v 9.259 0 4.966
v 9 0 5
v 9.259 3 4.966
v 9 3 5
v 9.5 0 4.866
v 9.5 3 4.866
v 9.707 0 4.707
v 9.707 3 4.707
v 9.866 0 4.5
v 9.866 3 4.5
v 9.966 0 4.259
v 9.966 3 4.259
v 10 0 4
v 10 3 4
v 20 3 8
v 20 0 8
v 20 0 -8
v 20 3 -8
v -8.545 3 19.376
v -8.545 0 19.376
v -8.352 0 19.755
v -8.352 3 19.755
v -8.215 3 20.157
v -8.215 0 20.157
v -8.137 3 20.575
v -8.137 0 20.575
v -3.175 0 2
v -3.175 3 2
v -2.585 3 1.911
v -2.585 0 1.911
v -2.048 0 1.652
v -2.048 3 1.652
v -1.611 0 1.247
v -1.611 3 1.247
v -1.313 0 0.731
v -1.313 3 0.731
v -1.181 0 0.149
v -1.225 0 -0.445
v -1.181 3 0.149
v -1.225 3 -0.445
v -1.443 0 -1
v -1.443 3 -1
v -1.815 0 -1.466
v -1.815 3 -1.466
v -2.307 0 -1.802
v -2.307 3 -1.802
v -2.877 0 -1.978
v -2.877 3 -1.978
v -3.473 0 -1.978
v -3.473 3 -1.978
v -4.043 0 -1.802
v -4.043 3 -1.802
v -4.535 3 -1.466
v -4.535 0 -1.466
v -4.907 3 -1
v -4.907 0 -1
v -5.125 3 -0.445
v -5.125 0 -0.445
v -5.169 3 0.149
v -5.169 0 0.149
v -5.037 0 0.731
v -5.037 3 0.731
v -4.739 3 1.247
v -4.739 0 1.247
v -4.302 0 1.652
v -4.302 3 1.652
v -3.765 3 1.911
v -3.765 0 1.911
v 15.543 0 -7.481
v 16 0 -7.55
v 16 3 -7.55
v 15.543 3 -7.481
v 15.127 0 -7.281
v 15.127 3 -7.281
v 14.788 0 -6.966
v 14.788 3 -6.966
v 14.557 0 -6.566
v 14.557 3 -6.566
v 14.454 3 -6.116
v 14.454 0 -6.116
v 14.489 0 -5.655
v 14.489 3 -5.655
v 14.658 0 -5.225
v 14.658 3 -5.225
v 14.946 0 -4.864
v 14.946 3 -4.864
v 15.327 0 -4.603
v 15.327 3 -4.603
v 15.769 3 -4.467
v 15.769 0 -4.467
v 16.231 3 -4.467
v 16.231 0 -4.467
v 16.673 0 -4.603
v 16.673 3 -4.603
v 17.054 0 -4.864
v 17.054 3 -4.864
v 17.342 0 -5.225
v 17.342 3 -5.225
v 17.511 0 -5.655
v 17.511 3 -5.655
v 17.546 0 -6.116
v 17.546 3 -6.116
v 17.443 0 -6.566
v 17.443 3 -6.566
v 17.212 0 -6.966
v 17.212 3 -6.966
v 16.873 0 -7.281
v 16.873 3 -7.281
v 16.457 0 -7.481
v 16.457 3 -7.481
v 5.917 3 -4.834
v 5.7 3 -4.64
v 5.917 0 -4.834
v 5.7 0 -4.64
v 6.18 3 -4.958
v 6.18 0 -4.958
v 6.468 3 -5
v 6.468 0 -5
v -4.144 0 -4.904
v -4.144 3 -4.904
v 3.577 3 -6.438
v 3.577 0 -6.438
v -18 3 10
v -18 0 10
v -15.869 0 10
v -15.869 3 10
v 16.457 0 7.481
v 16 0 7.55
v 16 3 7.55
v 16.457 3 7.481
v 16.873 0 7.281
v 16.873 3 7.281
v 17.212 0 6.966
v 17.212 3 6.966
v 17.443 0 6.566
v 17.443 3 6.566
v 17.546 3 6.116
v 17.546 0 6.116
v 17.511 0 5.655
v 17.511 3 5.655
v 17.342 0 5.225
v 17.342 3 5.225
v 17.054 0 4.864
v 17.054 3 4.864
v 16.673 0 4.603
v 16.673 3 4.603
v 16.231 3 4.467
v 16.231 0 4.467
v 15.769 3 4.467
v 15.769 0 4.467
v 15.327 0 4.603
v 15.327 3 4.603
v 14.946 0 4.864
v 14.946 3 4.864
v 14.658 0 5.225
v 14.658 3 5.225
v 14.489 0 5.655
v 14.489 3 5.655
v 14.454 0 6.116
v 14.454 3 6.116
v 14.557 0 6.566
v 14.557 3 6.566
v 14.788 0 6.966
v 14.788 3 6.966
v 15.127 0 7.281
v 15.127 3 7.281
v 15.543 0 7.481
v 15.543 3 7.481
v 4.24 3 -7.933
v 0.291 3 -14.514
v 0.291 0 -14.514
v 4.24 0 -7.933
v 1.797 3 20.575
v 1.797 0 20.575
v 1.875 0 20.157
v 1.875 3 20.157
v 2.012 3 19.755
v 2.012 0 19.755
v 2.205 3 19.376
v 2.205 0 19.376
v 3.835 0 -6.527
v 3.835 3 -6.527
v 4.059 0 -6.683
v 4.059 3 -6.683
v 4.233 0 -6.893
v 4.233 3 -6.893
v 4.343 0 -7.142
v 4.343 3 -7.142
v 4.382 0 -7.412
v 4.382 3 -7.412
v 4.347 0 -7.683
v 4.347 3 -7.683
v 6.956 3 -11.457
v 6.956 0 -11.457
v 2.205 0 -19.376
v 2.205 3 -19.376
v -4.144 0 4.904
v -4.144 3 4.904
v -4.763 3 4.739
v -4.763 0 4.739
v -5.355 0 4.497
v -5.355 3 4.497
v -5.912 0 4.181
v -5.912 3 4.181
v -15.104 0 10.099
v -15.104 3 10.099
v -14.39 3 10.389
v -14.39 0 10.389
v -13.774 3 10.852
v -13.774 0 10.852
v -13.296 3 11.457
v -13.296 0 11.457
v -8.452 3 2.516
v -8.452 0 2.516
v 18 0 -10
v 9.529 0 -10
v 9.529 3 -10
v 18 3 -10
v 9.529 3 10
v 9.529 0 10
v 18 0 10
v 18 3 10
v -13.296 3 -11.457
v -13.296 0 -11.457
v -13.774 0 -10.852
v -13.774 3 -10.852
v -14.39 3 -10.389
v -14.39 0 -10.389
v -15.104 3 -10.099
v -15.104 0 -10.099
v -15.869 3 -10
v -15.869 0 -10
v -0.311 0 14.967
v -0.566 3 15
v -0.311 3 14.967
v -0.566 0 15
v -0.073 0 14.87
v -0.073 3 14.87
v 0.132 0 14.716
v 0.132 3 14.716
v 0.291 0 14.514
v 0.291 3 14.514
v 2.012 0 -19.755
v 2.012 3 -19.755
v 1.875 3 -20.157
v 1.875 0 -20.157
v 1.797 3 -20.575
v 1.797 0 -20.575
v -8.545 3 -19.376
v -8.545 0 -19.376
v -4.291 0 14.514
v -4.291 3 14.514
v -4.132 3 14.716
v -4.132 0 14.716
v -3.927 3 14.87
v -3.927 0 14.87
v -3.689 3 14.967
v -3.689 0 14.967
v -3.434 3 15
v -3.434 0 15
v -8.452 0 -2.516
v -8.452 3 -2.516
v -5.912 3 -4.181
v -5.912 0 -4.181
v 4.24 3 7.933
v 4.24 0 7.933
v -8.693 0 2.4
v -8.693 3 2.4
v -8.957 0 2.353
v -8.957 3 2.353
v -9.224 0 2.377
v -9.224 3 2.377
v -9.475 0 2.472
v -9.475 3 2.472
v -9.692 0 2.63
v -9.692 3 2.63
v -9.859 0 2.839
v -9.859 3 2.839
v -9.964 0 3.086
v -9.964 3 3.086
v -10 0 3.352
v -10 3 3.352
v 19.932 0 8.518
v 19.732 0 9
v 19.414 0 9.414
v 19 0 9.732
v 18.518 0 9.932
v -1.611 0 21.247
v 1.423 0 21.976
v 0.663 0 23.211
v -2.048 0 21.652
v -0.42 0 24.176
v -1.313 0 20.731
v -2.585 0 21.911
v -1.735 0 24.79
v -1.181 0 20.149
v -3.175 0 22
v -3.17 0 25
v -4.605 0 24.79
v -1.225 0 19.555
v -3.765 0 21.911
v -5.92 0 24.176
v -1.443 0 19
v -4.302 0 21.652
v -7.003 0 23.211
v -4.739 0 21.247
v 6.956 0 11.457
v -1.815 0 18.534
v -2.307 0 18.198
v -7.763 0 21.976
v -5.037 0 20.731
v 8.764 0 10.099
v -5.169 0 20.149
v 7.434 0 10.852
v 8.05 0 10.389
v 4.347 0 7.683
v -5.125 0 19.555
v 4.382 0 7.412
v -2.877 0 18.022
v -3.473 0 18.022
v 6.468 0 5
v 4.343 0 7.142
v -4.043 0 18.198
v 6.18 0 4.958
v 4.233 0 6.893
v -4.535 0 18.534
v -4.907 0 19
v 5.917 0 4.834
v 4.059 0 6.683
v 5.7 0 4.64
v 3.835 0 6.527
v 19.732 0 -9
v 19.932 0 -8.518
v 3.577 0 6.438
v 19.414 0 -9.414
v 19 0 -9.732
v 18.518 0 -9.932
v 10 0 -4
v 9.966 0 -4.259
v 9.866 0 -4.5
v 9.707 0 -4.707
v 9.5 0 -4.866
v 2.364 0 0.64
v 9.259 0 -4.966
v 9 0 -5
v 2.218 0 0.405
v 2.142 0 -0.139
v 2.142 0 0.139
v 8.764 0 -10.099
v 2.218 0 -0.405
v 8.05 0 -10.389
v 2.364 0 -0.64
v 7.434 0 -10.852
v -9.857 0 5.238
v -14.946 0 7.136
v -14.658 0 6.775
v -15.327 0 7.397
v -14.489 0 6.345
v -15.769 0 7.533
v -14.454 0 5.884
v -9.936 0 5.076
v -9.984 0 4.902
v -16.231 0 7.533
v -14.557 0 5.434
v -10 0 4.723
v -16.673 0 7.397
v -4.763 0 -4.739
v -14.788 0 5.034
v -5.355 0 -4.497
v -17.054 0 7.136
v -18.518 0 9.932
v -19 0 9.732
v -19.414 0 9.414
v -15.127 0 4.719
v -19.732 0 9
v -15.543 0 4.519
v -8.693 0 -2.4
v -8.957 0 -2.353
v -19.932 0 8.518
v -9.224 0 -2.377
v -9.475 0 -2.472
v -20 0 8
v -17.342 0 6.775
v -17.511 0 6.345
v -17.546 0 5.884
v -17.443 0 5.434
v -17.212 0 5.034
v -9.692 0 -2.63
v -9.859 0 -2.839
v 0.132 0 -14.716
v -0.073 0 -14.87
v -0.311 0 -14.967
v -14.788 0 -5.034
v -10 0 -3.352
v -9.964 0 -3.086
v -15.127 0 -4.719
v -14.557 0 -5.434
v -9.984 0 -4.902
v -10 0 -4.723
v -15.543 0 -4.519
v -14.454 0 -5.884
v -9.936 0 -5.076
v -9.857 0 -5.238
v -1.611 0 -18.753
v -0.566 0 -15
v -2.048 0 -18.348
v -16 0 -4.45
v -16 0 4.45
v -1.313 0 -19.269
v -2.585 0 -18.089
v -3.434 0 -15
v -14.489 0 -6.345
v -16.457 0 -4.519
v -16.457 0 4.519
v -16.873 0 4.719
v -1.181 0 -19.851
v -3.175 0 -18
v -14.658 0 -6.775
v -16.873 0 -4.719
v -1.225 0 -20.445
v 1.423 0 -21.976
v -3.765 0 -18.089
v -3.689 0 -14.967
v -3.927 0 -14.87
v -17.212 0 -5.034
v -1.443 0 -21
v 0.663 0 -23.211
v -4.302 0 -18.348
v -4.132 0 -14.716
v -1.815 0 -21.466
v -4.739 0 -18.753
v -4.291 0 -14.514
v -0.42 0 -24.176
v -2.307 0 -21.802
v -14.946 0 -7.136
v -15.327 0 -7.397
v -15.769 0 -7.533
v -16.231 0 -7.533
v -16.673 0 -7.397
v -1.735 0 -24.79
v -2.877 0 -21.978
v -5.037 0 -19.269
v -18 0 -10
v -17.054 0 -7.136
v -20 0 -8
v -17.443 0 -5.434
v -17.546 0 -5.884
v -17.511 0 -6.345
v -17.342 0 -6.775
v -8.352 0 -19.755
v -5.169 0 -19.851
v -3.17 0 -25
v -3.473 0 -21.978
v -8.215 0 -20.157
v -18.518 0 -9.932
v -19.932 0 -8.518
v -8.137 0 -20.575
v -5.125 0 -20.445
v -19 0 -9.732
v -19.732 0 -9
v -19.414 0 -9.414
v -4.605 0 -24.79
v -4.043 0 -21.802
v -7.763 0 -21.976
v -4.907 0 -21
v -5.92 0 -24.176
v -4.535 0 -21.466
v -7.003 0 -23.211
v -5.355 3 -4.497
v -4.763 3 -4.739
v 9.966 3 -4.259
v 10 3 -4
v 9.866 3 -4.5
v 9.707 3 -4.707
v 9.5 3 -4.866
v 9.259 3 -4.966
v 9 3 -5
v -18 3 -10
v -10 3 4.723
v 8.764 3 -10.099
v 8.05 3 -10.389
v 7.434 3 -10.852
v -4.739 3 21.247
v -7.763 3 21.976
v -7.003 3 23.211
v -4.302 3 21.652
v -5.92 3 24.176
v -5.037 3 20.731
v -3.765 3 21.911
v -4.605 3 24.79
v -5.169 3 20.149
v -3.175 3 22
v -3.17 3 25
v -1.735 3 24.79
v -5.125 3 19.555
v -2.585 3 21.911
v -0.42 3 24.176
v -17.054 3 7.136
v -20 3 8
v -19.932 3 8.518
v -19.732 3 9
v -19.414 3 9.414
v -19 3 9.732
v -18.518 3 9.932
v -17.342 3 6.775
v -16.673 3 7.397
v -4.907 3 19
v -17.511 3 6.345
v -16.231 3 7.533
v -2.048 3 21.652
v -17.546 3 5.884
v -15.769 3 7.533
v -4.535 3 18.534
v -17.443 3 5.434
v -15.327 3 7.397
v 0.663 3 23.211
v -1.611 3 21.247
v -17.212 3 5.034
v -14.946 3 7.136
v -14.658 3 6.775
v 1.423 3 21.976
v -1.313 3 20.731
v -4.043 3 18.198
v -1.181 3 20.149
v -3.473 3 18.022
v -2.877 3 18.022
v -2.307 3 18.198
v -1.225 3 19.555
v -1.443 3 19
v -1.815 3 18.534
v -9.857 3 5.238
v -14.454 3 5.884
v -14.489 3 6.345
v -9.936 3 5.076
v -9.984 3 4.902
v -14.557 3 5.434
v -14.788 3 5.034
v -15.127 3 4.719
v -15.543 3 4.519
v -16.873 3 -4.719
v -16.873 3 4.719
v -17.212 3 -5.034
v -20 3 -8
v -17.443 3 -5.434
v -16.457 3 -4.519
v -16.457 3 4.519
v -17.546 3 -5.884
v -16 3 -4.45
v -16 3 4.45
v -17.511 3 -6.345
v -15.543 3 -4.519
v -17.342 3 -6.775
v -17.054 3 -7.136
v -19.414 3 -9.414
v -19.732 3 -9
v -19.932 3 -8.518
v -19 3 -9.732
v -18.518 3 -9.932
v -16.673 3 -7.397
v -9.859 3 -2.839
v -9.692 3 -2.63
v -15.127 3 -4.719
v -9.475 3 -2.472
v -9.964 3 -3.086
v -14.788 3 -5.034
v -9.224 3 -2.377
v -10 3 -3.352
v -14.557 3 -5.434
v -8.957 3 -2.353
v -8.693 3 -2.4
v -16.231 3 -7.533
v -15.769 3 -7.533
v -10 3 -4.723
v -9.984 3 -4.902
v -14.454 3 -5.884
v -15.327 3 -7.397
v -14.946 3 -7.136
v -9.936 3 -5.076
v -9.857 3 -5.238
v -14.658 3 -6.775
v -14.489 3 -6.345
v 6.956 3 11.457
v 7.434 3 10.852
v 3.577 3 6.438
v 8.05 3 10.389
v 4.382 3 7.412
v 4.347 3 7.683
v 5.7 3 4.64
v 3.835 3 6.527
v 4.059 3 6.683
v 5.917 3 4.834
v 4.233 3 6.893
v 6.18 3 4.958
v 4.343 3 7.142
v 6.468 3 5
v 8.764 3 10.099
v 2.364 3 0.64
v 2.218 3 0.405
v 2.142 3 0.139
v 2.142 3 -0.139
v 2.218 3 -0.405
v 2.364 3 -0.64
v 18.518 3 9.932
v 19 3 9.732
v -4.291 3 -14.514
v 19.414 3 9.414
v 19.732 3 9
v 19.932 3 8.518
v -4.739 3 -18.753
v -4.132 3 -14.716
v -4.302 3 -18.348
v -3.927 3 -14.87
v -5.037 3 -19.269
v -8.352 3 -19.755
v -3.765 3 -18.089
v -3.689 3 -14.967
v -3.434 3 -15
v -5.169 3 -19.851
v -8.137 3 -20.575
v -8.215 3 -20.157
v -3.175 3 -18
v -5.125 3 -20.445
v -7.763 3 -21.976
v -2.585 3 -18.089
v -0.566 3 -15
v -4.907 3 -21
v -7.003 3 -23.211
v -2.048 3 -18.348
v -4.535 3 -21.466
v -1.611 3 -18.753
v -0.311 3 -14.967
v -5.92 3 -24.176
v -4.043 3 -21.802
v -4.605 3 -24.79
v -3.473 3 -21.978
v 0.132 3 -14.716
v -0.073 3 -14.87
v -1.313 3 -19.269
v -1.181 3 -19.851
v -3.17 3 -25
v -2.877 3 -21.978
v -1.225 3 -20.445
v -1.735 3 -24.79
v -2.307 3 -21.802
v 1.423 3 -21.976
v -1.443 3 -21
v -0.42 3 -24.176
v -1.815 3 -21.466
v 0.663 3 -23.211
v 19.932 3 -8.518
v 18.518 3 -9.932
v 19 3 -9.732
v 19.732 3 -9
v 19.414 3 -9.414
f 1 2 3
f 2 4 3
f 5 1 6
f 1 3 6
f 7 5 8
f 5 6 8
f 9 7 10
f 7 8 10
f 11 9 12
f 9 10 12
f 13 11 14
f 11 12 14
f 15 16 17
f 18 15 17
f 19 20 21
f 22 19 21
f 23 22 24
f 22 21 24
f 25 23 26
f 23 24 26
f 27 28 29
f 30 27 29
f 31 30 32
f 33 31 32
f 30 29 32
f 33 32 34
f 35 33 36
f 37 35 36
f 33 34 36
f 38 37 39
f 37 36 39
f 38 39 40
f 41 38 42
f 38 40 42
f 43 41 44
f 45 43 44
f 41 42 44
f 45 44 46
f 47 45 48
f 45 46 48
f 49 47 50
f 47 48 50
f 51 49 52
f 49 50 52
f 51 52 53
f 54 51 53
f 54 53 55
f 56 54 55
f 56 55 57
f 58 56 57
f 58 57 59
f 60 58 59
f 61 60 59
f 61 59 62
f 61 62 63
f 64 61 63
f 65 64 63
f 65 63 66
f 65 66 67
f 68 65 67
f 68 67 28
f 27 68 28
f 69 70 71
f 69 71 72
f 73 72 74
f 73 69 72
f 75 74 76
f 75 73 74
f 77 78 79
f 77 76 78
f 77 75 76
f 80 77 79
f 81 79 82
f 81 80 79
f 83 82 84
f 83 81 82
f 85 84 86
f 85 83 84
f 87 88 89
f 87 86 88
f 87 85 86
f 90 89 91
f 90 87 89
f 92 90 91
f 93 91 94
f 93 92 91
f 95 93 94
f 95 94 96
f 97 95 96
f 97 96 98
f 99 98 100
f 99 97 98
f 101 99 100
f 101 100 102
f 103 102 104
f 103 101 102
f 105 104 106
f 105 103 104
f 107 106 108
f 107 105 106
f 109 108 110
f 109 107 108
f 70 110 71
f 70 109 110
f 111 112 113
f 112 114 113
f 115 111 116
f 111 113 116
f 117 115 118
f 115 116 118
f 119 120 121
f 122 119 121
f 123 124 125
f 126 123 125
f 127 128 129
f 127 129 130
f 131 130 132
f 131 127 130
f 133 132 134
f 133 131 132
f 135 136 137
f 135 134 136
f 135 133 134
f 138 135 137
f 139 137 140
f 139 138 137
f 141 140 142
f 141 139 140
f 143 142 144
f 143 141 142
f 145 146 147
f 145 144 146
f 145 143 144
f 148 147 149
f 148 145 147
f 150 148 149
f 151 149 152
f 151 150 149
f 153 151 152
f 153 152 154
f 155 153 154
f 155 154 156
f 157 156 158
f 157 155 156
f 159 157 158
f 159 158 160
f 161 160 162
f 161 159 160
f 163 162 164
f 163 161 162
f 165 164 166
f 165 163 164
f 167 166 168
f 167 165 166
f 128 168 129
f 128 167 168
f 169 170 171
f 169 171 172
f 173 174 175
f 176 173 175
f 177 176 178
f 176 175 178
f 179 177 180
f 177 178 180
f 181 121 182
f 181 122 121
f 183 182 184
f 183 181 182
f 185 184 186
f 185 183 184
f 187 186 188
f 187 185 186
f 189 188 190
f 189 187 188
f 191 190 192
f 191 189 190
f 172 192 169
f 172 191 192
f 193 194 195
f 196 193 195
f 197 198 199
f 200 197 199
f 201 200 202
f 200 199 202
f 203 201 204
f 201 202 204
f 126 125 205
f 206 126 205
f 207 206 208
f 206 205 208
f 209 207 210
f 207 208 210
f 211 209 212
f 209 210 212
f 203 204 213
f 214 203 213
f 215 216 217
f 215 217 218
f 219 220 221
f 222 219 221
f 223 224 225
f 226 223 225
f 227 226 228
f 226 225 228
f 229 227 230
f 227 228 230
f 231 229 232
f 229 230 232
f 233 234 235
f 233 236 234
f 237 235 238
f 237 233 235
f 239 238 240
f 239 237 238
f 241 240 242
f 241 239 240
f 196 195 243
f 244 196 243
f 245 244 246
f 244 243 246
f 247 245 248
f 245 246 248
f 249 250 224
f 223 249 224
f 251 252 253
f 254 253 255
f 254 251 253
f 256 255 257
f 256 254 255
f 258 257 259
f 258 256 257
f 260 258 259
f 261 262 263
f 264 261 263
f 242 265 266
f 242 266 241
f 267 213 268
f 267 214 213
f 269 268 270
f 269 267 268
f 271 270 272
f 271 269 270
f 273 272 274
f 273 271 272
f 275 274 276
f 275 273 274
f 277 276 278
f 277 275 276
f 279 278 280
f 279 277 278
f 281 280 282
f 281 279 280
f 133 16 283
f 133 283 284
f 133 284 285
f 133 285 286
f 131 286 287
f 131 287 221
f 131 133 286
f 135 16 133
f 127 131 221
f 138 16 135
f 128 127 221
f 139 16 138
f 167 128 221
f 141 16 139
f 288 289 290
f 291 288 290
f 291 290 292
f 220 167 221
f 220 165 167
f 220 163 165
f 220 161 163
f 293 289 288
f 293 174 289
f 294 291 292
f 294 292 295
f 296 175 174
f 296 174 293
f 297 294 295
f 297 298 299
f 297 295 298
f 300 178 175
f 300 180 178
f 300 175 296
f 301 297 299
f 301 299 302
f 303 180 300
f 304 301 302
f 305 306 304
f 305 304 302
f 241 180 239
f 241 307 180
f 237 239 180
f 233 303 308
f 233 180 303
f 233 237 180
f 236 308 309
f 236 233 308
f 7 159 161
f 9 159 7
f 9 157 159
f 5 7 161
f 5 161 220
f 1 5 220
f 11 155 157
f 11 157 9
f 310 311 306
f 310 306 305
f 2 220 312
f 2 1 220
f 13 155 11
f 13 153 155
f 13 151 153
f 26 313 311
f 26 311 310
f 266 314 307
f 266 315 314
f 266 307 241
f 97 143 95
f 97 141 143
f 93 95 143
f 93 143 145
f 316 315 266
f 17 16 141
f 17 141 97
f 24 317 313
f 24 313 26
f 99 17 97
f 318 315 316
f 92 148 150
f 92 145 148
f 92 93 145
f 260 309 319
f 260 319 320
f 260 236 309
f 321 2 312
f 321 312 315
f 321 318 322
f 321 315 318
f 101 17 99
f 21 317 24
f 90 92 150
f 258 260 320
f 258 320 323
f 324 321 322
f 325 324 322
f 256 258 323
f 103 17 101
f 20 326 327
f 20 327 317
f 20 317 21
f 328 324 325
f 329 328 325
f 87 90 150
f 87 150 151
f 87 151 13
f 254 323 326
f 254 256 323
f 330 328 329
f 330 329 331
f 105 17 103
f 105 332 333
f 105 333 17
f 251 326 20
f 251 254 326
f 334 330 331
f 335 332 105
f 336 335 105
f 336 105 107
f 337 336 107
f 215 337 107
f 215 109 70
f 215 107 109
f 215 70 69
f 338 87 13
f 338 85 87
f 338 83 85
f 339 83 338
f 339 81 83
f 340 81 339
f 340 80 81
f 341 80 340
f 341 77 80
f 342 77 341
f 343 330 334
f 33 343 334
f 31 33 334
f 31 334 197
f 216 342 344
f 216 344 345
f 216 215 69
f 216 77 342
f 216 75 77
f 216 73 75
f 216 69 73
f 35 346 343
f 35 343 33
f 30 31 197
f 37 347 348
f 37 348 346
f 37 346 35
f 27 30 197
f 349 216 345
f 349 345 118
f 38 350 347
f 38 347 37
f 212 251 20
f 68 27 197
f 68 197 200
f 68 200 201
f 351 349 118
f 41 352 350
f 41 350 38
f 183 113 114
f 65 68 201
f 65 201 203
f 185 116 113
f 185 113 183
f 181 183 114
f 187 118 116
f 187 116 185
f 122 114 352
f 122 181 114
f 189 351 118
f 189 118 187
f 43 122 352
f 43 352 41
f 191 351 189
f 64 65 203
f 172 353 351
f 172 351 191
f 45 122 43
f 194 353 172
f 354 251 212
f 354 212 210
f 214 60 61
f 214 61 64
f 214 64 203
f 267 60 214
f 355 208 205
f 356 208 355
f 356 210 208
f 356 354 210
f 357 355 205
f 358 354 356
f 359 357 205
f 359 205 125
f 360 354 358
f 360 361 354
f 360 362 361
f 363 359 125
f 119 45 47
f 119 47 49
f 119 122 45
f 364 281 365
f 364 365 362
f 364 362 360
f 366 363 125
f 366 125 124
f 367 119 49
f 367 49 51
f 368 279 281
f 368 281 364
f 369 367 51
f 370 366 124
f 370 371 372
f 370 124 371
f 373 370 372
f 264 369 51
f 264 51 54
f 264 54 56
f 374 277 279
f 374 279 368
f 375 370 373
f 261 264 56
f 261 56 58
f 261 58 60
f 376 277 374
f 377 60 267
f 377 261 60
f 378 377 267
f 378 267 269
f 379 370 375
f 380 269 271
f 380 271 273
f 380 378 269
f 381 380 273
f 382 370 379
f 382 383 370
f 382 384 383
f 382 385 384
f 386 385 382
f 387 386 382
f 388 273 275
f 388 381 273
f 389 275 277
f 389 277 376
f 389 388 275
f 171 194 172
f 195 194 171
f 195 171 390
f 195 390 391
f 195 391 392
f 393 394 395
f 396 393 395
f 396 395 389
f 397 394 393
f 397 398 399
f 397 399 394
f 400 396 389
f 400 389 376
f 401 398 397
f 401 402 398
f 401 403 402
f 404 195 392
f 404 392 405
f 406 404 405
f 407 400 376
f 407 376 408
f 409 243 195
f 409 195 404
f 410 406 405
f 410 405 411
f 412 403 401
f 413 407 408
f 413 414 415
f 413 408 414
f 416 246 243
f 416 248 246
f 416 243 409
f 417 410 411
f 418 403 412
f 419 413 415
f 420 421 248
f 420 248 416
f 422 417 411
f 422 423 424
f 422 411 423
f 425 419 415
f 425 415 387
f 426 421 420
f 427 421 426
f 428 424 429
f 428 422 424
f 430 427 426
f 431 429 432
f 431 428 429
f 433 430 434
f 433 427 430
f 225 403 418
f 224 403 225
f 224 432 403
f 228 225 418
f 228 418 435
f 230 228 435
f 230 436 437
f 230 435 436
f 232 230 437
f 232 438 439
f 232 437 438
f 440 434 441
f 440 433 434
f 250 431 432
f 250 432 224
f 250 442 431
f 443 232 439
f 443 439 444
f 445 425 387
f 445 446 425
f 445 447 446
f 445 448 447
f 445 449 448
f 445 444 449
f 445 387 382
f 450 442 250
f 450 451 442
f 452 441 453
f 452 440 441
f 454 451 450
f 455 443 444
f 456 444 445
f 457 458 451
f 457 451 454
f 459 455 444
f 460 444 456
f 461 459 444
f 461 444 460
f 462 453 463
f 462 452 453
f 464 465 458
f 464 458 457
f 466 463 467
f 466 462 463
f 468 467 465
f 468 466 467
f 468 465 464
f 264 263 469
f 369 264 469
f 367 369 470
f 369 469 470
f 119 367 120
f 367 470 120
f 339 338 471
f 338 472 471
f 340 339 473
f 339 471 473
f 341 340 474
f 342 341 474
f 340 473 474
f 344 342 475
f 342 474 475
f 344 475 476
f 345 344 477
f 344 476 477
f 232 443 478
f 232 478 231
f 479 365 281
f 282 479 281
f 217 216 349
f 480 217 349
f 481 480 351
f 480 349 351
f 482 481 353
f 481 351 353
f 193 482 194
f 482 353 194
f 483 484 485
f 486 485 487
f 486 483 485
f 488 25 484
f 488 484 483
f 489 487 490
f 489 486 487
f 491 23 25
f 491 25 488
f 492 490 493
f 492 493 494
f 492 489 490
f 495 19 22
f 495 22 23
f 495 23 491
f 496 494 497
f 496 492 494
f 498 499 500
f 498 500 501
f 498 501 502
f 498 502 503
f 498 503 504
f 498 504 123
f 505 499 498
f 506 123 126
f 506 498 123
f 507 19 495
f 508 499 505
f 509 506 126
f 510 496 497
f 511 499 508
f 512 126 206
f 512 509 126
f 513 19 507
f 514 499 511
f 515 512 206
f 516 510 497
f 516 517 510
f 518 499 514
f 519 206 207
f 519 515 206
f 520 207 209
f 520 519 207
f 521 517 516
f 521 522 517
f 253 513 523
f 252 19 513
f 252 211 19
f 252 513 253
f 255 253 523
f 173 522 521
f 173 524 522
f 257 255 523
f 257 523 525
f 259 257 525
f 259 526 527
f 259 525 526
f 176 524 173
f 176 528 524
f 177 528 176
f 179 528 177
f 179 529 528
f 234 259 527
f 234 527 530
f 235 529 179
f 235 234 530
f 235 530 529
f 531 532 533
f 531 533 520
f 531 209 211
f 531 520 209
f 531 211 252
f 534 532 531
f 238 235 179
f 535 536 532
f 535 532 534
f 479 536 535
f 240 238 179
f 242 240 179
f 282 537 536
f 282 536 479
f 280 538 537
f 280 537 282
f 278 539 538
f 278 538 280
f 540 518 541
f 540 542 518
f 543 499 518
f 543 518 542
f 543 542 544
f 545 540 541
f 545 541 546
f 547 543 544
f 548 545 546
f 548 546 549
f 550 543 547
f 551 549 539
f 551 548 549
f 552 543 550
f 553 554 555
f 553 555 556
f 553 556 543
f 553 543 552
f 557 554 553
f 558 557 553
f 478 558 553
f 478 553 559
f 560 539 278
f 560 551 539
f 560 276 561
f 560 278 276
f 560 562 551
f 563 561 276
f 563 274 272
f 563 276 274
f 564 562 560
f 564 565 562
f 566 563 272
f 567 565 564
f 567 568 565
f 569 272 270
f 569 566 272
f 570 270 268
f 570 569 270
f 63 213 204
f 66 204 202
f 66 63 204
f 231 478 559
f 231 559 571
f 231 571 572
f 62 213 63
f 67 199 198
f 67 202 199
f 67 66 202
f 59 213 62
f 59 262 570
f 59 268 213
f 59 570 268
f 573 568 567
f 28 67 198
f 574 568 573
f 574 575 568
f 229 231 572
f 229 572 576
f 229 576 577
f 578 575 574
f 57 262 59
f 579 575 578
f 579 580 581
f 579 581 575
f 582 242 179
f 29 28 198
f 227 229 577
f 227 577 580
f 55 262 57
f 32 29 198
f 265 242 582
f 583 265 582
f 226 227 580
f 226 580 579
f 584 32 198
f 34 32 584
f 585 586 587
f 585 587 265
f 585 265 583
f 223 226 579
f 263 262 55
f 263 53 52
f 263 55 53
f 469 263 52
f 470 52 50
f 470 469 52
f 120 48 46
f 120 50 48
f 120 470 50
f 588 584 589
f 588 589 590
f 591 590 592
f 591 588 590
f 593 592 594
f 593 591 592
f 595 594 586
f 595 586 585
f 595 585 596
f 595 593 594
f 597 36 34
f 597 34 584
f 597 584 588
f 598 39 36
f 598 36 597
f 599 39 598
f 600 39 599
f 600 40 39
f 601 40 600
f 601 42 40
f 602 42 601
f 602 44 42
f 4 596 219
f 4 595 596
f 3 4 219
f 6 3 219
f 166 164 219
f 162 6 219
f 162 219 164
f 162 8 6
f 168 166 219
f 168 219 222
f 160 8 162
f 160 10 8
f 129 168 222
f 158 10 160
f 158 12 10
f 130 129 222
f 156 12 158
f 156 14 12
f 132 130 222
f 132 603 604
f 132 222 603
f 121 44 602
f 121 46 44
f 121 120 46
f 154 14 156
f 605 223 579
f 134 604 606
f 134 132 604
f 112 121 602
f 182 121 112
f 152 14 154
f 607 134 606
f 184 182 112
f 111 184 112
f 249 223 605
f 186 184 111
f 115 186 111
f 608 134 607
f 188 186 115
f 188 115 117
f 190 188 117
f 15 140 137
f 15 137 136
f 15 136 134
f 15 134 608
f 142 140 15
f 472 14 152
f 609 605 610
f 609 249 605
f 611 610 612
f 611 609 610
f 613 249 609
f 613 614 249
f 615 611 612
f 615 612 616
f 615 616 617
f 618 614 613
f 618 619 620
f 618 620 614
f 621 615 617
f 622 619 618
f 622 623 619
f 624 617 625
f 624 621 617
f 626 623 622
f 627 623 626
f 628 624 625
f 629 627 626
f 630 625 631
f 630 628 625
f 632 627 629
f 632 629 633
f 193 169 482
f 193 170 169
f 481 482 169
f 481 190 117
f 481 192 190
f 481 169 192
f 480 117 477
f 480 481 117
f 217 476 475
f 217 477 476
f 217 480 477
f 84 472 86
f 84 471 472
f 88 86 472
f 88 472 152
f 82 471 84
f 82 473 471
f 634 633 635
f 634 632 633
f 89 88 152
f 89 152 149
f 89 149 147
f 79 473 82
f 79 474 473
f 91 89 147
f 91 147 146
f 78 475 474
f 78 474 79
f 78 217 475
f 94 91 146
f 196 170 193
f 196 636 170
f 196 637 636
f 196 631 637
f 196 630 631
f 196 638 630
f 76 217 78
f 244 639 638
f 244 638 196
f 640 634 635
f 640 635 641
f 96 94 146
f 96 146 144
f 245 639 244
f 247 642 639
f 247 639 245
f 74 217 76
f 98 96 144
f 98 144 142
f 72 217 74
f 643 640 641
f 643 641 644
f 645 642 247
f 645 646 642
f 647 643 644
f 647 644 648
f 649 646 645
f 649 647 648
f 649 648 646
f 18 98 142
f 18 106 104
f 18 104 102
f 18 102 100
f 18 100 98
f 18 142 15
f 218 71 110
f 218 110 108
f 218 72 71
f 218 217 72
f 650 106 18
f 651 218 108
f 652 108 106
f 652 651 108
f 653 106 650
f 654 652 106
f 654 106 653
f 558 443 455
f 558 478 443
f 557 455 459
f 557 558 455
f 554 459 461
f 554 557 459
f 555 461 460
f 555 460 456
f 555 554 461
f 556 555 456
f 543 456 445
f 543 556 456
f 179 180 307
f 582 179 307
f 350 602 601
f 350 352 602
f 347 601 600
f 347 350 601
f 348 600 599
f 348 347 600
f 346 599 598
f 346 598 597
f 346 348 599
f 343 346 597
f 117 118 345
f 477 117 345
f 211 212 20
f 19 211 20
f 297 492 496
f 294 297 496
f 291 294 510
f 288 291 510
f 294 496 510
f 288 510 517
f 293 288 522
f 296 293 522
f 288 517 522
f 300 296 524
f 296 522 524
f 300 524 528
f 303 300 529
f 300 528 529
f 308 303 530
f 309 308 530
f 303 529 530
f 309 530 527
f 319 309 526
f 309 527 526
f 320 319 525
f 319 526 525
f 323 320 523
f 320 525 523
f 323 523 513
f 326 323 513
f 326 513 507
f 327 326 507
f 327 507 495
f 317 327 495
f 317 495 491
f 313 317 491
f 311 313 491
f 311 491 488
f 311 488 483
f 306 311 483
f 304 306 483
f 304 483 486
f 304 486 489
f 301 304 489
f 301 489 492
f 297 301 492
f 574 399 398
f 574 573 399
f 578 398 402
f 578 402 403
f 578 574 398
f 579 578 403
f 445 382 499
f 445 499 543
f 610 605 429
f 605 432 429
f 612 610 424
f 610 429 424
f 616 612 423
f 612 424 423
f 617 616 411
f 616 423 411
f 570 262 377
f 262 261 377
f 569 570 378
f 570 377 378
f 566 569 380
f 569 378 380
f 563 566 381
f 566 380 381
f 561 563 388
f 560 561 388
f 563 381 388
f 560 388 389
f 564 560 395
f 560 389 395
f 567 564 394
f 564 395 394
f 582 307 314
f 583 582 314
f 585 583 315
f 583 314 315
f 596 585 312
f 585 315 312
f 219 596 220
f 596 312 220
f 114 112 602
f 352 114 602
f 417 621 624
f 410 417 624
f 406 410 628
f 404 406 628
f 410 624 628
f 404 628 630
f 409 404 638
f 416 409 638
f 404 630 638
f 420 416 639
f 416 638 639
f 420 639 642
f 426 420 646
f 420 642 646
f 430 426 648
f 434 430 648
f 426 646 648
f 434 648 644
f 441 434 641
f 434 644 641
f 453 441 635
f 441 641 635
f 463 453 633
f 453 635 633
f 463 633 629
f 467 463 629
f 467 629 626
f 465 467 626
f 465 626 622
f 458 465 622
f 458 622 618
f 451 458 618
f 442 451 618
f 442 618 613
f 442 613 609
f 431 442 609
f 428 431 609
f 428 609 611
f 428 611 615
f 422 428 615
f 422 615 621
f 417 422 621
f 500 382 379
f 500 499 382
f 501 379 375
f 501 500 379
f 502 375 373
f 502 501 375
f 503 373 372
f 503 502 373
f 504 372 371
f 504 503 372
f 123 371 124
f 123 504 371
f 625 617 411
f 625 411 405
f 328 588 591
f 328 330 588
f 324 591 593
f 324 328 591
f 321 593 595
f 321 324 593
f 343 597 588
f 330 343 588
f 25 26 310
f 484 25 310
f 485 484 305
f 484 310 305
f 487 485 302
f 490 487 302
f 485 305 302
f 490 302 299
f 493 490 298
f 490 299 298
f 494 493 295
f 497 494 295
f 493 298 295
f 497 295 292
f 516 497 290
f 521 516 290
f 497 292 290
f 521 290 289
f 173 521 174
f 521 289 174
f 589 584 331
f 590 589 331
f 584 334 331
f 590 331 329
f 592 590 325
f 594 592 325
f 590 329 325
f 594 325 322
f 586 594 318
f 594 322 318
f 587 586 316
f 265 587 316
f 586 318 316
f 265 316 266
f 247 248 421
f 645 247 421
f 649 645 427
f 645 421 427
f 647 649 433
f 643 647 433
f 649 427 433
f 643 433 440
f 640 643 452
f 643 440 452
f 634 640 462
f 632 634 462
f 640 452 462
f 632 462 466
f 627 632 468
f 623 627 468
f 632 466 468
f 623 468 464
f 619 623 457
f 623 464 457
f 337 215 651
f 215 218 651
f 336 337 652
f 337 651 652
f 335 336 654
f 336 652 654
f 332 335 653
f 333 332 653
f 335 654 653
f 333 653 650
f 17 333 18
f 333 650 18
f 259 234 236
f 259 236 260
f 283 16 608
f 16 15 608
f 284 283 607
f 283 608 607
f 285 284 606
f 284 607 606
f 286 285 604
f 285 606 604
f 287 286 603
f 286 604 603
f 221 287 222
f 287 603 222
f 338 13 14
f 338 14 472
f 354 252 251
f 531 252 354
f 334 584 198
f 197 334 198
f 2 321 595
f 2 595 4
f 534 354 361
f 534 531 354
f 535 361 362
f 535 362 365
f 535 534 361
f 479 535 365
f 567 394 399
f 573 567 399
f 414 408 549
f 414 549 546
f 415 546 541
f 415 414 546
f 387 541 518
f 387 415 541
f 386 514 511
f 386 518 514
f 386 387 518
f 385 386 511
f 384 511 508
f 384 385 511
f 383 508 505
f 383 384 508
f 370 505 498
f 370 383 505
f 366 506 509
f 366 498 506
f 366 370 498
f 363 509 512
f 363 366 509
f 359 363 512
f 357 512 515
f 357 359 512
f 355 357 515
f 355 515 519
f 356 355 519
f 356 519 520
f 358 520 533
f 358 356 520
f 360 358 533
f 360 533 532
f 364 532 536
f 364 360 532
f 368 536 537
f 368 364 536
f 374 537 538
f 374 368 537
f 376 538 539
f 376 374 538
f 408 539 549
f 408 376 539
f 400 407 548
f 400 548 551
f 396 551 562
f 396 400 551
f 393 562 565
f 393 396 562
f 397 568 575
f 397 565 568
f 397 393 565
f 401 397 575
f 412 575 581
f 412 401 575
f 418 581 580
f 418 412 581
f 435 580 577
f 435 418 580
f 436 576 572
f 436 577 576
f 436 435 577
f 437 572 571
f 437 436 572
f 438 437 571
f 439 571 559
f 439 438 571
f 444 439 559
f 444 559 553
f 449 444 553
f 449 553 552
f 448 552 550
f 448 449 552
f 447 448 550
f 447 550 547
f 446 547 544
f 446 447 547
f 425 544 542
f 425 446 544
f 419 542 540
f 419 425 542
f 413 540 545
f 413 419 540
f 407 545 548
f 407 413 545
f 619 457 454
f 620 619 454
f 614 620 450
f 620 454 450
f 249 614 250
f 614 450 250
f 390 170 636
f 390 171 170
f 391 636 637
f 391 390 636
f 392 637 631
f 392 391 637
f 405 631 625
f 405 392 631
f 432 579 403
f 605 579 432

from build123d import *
from OCP.BRepFilletAPI import BRepFilletAPI_MakeChamfer

# Parameters (mm, degrees)
SKETCH_1_W           = 40
SKETCH_1_H           = 20
SKETCH_1_R           = 1.55
SKETCH_1_W_2         = 20
SKETCH_1_H_2         = 10
EXTRUDE_1_DEPTH      = 3
SKETCH_2_R           = 2
EXTRUDE_2_DEPTH      = 3
FILLET_1_R           = 2
SKETCH_3_W           = 10
SKETCH_3_H           = 10
CUT_EXTRUDE_1_DEPTH  = 33.155870382
CHAMFER_1_SIZE       = 6
CHAMFER_1_SIZE_2     = 10
FILLET_2_OUTLINE_R   = 2
FILLET_2_OUTLINE_R_2 = 1.55
FILLET_2_OUTLINE_W   = 20
FILLET_2_OUTLINE_H   = 10
FILLET_2_DEPTH       = 3
CUT_EXTRUDE_2_DEPTH  = 33.155870382
SKETCH_5_R           = 2
EXTRUDE_3_DEPTH      = 3
FILLET_3_R           = 1
SKETCH_6_R           = 2
EXTRUDE_4_DEPTH      = 3
SKETCH_7_R           = 2
CUT_EXTRUDE_3_DEPTH  = 33.155870382


with BuildPart() as part:
    # 草图1 → 凸台-拉伸1 (new body)
    with BuildSketch(Plane(origin=(0, 0, 0), x_dir=(1, 0, 0), z_dir=(0, 1, 0))):
        Rectangle(SKETCH_1_W, SKETCH_1_H)
        with Locations(Location((-16, 6, 0), (0, 0, 270))):
            Circle(SKETCH_1_R, mode=Mode.SUBTRACT)
        with Locations(Location((16, 6, 0), (0, 0, 90))):
            Circle(SKETCH_1_R, mode=Mode.SUBTRACT)
        with Locations(Location((16, -6, 0), (0, 0, 270))):
            Circle(SKETCH_1_R, mode=Mode.SUBTRACT)
        with Locations(Location((-16, -6, 0), (0, 0, 90))):
            Circle(SKETCH_1_R, mode=Mode.SUBTRACT)
        Rectangle(SKETCH_1_W_2, SKETCH_1_H_2, mode=Mode.SUBTRACT)
    extrude(amount=EXTRUDE_1_DEPTH)

    # 草图2 → 凸台-拉伸2 (add, through all)
    with BuildSketch(Plane(origin=(0, 3, 0), x_dir=(1, 0, 0), z_dir=(0, 1, 0))):
        with BuildLine():
            Line((-8.17, 20), (-8.17, -20))
            ThreePointArc((-8.17, -20), (-3.17, -25), (1.83, -20))
            Line((1.83, -20), (1.83, 20))
            ThreePointArc((1.83, 20), (-3.17, 25), (-8.17, 20))
        make_face()
        with Locations(Location((-3.17, 20, 0), (0, 0, 270))):
            Circle(SKETCH_2_R, mode=Mode.SUBTRACT)
        with Locations(Location((-3.17, -20, 0), (0, 0, 270))):
            Circle(SKETCH_2_R, mode=Mode.SUBTRACT)
    extrude(amount=-EXTRUDE_2_DEPTH)

    # 圆角1
    fillet_1_edges = [part.edges().sort_by_distance(p)[0] for p in [
        (20, 1.5, 10),
        (-20, 1.5, 10),
        (-20, 1.5, -10),
        (20, 1.5, -10),
    ]]
    fillet(fillet_1_edges, radius=FILLET_1_R)

    # 草图3 → 切除-拉伸1 (cut, through all)
    with BuildSketch(Plane(origin=(0, 3, 0), x_dir=(1, 0, 0), z_dir=(0, 1, 0))):
        with Locations((-3.17, 0)):
            Rectangle(SKETCH_3_W, SKETCH_3_H)
    extrude(amount=-CUT_EXTRUDE_1_DEPTH, mode=Mode.SUBTRACT)

    # 倒角1
    chamfer_1_edges_1 = [part.edges().sort_by_distance(p)[0] for p in [
        (-8.17, 1.5, 10),
    ]]
    chamfer_1_side_1 = [part.faces().sort_by_distance(p)[0] for p in [
        (-8.29, 1.5, 10),
    ]]
    chamfer_1_edges_2 = [part.edges().sort_by_distance(p)[0] for p in [
        (1.83, 1.5, 10),
    ]]
    chamfer_1_side_2 = [part.faces().sort_by_distance(p)[0] for p in [
        (1.95, 1.5, 10),
    ]]
    chamfer_1_edges_3 = [part.edges().sort_by_distance(p)[0] for p in [
        (1.83, 1.5, -10),
    ]]
    chamfer_1_side_3 = [part.faces().sort_by_distance(p)[0] for p in [
        (1.83, 1.5, -10.12),
    ]]
    chamfer_1_edges_4 = [part.edges().sort_by_distance(p)[0] for p in [
        (-8.17, 1.5, -10),
    ]]
    chamfer_1_side_4 = [part.faces().sort_by_distance(p)[0] for p in [
        (-8.29, 1.5, -10),
    ]]
    chamfer_1 = BRepFilletAPI_MakeChamfer(part.part.solid().wrapped)
    for e in chamfer_1_edges_1:
        chamfer_1.Add(CHAMFER_1_SIZE - 0.0001, CHAMFER_1_SIZE_2 - 0.0001, e.wrapped, chamfer_1_side_1[0].wrapped)
    for e in chamfer_1_edges_2:
        chamfer_1.Add(CHAMFER_1_SIZE - 0.0001, CHAMFER_1_SIZE_2 - 0.0001, e.wrapped, chamfer_1_side_2[0].wrapped)
    for e in chamfer_1_edges_3:
        chamfer_1.Add(CHAMFER_1_SIZE_2 - 0.0001, CHAMFER_1_SIZE - 0.0001, e.wrapped, chamfer_1_side_3[0].wrapped)
    for e in chamfer_1_edges_4:
        chamfer_1.Add(CHAMFER_1_SIZE - 0.0001, CHAMFER_1_SIZE_2 - 0.0001, e.wrapped, chamfer_1_side_4[0].wrapped)
    add(Compound.cast(chamfer_1.Shape()), mode=Mode.REPLACE)  # a hair under: the kernel refuses the full size

    # 圆角2: read off the stored shape, not the designer's step
    # 圆角2 outline → 圆角2 (add)
    with BuildSketch(Plane(origin=(0, 0, 0), x_dir=(1, 0, 0), z_dir=(0, 1, 0))):
        with BuildLine():
            ThreePointArc((18, -10), (19.414213562, -9.414213562), (20, -8))
            Line((20, -8), (20, 8))
            ThreePointArc((20, 8), (19.414213562, 9.414213562), (18, 10))
            Line((18, 10), (9.528571137, 10))
            ThreePointArc((9.528571137, 10), (8.050474692, 10.38940028), (6.95609236, 11.456512734))
            Line((6.95609236, 11.456512734), (2.204529459, 19.375784235))
            ThreePointArc((2.204529459, 19.375784235), (1.9367411, 19.953413027), (1.796880148, 20.574544688))
            ThreePointArc((1.796880148, 20.574544688), (-3.17, 25), (-8.136880148, 20.574544688))
            ThreePointArc((-8.136880148, 20.574544688), (-8.2767411, 19.953413027), (-8.544529459, 19.375784235))
            Line((-8.544529459, 19.375784235), (-13.29609236, 11.456512734))
            ThreePointArc((-13.29609236, 11.456512734), (-14.390474692, 10.38940028), (-15.868571137, 10))
            Line((-15.868571137, 10), (-18, 10))
            ThreePointArc((-18, 10), (-19.414213562, 9.414213562), (-20, 8))
            Line((-20, 8), (-20, -8))
            ThreePointArc((-20, -8), (-19.414213562, -9.414213562), (-18, -10))
            Line((-18, -10), (-15.868571137, -10))
            ThreePointArc((-15.868571137, -10), (-14.390474692, -10.38940028), (-13.29609236, -11.456512734))
            Line((-13.29609236, -11.456512734), (-8.544529459, -19.375784235))
            ThreePointArc((-8.544529459, -19.375784235), (-8.2767411, -19.953413027), (-8.136880148, -20.574544688))
            ThreePointArc((-8.136880148, -20.574544688), (-3.17, -25), (1.796880148, -20.574544688))
            ThreePointArc((1.796880148, -20.574544688), (1.9367411, -19.953413027), (2.204529459, -19.375784235))
            Line((2.204529459, -19.375784235), (6.95609236, -11.456512734))
            ThreePointArc((6.95609236, -11.456512734), (8.050474692, -10.38940028), (9.528571137, -10))
            Line((9.528571137, -10), (18, -10))
        make_face()
        with Locations((-3.17, -20)):
            Circle(FILLET_2_OUTLINE_R, mode=Mode.SUBTRACT)
        with Locations((-16, -6)):
            Circle(FILLET_2_OUTLINE_R_2, mode=Mode.SUBTRACT)
        with Locations((16, -6)):
            Circle(FILLET_2_OUTLINE_R_2, mode=Mode.SUBTRACT)
        with Locations((-16, 6)):
            Circle(FILLET_2_OUTLINE_R_2, mode=Mode.SUBTRACT)
        with Locations((-3.17, 20)):
            Circle(FILLET_2_OUTLINE_R, mode=Mode.SUBTRACT)
        Rectangle(FILLET_2_OUTLINE_W, FILLET_2_OUTLINE_H, mode=Mode.SUBTRACT)
        with Locations((16, 6)):
            Circle(FILLET_2_OUTLINE_R_2, mode=Mode.SUBTRACT)
    extrude(amount=FILLET_2_DEPTH)

    # 草图4 → 切除-拉伸2 (cut, through all)
    with BuildSketch(Plane(origin=(0, 3, 0), x_dir=(1, 0, 0), z_dir=(0, 1, 0))):
        Polygon((-10, 5), (-4, 15), (0, 15), (6, 5), align=None)
        Polygon((-10, -5), (6, -5), (0, -15), (-4, -15), align=None)
    extrude(amount=-CUT_EXTRUDE_2_DEPTH, mode=Mode.SUBTRACT)

    # 草图5 → 凸台-拉伸3 (add, through all)
    with BuildSketch(Plane(origin=(0, 3, 0), x_dir=(1, 0, 0), z_dir=(0, 1, 0))):
        with BuildLine():
            Line((-10, 1.5), (-5.912088761, 4.18102251))
            ThreePointArc((-5.912088761, 4.18102251), (-5.06302182, 4.627793036), (-4.144252411, 4.904164785))
            Line((-4.144252411, 4.904164785), (4.971008489, 6.714985851))
            Line((4.971008489, 6.714985851), (6, 5))
            Line((6, 5), (1.83, 0))
            Line((1.83, 0), (6, -5))
            Line((6, -5), (4.971008489, -6.714985851))
            Line((4.971008489, -6.714985851), (-4.144252411, -4.904164785))
            ThreePointArc((-4.144252411, -4.904164785), (-5.06302182, -4.627793036), (-5.912088761, -4.18102251))
            Line((-5.912088761, -4.18102251), (-10, -1.5))
            Line((-10, -1.5), (-10, 1.5))
        make_face()
        with Locations(Location((-3.17, 0, 0), (0, 0, 270))):
            Circle(SKETCH_5_R, mode=Mode.SUBTRACT)
    extrude(amount=-EXTRUDE_3_DEPTH)

    # 圆角3
    fillet_3_edges = [part.edges().sort_by_distance(p)[0] for p in [
        (6, 1.5, -5),
        (-4, 1.5, -15),
        (0, 1.5, -15),
        (-4, 1.5, 15),
        (6, 1.5, 5),
        (0, 1.5, 15),
        (-10, 1.5, 1.5),
        (-10, 1.5, -1.5),
        (4.971008489, 1.5, -6.714985851),
        (1.83, 1.5, 0),
        (4.971008489, 1.5, 6.714985851),
        (10, 1.5, 5),
        (10, 1.5, -5),
        (-10, 1.5, -5),
        (-10, 1.5, 5),
    ]]
    fillet(fillet_3_edges, radius=FILLET_3_R)

    # 草图6 → 凸台-拉伸4 (add, through all)
    with BuildSketch(Plane(origin=(0, 3, 0), x_dir=(1, 0, 0), z_dir=(0, 1, 0))):
        with Locations((-3.17, -20)):
            Circle(SKETCH_6_R)
        with Locations((-3.17, 0)):
            Circle(SKETCH_6_R)
        with Locations((-3.17, 20)):
            Circle(SKETCH_6_R)
    extrude(amount=-EXTRUDE_4_DEPTH)

    # 草图7 → 切除-拉伸3 (cut, through all)
    with BuildSketch(Plane(origin=(0, 3, 0), x_dir=(1, 0, 0), z_dir=(0, 1, 0))):
        with Locations(Location((-3.175, 20, 0), (0, 0, 270))):
            Circle(SKETCH_7_R)
        with Locations(Location((-3.175, 0, 0), (0, 0, 270))):
            Circle(SKETCH_7_R)
        with Locations(Location((-3.175, -20, 0), (0, 0, 270))):
            Circle(SKETCH_7_R)
    extrude(amount=-CUT_EXTRUDE_3_DEPTH, mode=Mode.SUBTRACT)


solid = part.part
